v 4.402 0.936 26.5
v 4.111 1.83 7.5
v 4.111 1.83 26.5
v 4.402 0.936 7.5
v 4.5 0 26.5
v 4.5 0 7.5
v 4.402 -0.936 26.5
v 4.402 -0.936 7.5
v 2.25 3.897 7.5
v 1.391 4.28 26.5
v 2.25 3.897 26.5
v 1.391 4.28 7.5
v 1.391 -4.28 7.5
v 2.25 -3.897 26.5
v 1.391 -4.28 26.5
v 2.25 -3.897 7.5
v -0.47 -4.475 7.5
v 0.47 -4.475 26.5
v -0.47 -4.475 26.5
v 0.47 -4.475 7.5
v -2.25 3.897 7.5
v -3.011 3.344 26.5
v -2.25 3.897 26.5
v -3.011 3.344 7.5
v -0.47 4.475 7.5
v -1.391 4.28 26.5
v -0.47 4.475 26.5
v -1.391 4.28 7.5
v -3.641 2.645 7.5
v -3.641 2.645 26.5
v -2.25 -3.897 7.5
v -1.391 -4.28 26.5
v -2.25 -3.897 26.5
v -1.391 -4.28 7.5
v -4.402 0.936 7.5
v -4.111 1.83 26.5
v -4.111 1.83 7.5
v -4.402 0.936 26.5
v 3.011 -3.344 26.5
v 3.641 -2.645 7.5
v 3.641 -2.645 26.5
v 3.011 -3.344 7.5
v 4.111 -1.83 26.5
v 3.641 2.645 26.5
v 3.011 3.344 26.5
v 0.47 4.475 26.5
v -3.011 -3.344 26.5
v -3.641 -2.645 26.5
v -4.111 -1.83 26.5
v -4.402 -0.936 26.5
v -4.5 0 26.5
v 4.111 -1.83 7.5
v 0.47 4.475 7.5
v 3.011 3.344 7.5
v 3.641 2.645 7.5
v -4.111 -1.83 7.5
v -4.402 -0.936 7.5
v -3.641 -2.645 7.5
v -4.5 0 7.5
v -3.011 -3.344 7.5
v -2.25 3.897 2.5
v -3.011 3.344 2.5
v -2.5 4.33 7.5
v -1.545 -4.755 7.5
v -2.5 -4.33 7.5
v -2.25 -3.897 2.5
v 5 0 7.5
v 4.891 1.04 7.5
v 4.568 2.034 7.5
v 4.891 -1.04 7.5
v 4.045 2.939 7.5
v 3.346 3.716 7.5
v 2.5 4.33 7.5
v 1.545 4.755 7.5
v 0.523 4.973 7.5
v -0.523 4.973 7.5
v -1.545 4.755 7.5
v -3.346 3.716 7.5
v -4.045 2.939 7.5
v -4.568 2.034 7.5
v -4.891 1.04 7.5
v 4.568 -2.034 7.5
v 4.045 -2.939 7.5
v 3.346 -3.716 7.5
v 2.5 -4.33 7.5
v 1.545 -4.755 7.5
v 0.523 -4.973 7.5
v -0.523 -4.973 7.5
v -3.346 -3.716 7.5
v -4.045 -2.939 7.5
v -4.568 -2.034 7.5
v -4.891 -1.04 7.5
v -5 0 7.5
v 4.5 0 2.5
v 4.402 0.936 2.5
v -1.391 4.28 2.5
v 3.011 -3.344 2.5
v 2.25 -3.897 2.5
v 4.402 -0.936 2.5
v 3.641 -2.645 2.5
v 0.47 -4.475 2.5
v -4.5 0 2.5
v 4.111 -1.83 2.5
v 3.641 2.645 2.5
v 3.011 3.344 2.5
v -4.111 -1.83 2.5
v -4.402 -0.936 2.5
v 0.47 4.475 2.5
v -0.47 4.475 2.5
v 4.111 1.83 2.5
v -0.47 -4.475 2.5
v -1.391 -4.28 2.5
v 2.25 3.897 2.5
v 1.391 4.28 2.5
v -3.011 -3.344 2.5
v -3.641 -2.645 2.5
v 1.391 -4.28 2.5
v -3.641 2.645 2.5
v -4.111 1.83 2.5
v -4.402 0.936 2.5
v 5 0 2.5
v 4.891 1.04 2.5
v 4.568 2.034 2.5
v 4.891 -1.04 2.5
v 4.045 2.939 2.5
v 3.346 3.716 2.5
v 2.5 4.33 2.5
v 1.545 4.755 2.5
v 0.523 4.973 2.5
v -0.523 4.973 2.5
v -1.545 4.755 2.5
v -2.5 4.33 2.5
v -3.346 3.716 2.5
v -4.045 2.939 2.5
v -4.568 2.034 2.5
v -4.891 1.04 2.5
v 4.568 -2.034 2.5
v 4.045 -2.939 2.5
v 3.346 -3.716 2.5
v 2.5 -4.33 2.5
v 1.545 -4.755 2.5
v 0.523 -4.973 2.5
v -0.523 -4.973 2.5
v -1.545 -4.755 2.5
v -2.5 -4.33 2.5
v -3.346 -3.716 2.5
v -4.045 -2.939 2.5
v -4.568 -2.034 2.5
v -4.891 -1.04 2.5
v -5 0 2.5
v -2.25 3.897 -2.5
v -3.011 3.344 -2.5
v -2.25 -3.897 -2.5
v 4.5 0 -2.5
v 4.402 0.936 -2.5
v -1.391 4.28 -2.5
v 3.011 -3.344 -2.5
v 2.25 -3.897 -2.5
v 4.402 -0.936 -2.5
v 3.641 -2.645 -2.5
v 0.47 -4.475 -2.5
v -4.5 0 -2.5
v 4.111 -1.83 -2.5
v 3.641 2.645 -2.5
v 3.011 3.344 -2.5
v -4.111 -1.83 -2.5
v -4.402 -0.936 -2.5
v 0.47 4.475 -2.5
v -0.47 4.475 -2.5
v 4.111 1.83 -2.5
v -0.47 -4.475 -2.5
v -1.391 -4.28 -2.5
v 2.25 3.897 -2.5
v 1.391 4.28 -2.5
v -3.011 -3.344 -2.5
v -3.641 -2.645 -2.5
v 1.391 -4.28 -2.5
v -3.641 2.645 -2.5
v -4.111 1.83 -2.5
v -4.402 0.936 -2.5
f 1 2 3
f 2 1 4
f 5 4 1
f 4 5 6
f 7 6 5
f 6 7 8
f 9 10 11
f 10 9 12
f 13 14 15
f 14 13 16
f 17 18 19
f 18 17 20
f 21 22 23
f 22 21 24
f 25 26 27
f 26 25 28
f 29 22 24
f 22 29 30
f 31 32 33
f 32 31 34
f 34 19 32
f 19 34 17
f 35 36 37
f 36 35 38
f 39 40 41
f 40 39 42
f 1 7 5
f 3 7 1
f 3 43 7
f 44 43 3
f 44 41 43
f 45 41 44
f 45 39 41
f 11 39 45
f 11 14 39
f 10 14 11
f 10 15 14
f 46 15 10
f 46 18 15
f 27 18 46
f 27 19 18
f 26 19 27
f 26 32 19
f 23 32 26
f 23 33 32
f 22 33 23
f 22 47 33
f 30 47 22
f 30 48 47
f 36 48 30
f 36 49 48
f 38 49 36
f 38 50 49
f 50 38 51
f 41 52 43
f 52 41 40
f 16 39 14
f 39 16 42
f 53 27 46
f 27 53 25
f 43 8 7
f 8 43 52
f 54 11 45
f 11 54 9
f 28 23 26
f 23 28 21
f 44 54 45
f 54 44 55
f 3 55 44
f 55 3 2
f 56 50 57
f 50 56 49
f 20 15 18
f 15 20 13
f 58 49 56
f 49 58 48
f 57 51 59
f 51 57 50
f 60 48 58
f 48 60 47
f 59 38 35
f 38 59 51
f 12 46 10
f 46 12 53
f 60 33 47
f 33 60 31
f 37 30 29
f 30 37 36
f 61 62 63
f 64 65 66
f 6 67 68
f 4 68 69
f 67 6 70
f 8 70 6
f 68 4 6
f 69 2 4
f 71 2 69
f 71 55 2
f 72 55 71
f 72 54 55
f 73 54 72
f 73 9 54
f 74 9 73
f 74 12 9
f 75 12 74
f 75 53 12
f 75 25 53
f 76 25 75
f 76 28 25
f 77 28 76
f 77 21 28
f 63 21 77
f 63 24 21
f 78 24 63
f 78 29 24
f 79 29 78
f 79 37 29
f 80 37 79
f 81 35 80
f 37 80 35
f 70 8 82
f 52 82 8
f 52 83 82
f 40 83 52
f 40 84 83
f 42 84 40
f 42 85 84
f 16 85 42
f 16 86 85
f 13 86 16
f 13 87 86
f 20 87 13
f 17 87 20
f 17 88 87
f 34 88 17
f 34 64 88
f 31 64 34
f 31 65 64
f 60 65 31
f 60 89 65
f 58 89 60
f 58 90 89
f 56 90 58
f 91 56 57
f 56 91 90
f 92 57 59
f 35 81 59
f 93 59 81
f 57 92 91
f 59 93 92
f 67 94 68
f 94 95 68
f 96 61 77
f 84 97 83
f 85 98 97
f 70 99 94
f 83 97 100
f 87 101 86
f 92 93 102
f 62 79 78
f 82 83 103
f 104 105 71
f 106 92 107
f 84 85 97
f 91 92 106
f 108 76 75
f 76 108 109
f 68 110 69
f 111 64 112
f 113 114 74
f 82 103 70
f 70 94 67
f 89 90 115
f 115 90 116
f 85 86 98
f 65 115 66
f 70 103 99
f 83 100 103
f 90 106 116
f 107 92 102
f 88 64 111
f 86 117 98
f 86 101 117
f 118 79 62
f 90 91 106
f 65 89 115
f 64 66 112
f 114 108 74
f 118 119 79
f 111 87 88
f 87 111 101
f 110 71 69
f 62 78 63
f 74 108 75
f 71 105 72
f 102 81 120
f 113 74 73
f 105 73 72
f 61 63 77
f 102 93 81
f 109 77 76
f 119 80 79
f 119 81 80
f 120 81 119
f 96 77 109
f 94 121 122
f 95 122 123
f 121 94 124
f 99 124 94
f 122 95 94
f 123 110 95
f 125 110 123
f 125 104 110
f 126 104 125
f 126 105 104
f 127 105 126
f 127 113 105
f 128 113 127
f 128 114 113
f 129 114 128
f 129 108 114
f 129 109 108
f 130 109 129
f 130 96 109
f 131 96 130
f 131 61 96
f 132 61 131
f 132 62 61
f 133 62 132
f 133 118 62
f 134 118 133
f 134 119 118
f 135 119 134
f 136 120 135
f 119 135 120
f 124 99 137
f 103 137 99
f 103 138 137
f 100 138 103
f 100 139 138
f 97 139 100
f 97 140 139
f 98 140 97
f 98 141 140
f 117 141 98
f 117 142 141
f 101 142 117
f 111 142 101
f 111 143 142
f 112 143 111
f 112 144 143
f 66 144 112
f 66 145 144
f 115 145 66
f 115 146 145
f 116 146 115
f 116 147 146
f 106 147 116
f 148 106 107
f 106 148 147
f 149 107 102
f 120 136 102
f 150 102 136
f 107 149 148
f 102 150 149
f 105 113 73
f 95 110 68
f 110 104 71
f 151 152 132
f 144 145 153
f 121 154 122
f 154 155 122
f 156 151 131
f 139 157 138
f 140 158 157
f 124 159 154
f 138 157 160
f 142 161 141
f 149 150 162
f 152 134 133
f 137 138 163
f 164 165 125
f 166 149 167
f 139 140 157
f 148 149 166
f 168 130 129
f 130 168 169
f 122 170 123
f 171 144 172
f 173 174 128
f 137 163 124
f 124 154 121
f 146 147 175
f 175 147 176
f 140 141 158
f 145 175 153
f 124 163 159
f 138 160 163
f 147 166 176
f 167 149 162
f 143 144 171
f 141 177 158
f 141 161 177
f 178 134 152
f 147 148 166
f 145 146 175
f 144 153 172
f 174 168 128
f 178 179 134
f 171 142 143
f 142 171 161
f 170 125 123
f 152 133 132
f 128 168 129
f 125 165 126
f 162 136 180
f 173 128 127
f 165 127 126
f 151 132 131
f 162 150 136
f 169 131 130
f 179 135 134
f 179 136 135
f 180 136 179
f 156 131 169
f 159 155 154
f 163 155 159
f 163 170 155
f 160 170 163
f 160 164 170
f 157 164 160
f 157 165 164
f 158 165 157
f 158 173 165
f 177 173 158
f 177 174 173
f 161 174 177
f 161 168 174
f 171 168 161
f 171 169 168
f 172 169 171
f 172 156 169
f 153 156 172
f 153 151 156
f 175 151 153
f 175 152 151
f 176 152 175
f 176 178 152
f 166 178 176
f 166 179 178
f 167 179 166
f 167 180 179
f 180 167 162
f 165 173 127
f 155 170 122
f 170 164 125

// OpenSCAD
   tuboesterno(5,21,4.5,5,30);
   
   module tuboesterno(l2,l3,rag1,rag2,resolution){
       difference(){
 difference(){
   union(){
        translate([0,0,16])
         cylinder(h=l3,r=rag1,$fn=resolution,center=true);
          translate([0,0,5])
         cylinder(h=l2,r1=rag1,r2=rag2,$fn=resolution,center=true);
        translate([0,0,0])
         cylinder(h=l2,r1=rag1,r2=rag2,$fn=resolution,center=true);
    }
    
   }
   
 }
}
